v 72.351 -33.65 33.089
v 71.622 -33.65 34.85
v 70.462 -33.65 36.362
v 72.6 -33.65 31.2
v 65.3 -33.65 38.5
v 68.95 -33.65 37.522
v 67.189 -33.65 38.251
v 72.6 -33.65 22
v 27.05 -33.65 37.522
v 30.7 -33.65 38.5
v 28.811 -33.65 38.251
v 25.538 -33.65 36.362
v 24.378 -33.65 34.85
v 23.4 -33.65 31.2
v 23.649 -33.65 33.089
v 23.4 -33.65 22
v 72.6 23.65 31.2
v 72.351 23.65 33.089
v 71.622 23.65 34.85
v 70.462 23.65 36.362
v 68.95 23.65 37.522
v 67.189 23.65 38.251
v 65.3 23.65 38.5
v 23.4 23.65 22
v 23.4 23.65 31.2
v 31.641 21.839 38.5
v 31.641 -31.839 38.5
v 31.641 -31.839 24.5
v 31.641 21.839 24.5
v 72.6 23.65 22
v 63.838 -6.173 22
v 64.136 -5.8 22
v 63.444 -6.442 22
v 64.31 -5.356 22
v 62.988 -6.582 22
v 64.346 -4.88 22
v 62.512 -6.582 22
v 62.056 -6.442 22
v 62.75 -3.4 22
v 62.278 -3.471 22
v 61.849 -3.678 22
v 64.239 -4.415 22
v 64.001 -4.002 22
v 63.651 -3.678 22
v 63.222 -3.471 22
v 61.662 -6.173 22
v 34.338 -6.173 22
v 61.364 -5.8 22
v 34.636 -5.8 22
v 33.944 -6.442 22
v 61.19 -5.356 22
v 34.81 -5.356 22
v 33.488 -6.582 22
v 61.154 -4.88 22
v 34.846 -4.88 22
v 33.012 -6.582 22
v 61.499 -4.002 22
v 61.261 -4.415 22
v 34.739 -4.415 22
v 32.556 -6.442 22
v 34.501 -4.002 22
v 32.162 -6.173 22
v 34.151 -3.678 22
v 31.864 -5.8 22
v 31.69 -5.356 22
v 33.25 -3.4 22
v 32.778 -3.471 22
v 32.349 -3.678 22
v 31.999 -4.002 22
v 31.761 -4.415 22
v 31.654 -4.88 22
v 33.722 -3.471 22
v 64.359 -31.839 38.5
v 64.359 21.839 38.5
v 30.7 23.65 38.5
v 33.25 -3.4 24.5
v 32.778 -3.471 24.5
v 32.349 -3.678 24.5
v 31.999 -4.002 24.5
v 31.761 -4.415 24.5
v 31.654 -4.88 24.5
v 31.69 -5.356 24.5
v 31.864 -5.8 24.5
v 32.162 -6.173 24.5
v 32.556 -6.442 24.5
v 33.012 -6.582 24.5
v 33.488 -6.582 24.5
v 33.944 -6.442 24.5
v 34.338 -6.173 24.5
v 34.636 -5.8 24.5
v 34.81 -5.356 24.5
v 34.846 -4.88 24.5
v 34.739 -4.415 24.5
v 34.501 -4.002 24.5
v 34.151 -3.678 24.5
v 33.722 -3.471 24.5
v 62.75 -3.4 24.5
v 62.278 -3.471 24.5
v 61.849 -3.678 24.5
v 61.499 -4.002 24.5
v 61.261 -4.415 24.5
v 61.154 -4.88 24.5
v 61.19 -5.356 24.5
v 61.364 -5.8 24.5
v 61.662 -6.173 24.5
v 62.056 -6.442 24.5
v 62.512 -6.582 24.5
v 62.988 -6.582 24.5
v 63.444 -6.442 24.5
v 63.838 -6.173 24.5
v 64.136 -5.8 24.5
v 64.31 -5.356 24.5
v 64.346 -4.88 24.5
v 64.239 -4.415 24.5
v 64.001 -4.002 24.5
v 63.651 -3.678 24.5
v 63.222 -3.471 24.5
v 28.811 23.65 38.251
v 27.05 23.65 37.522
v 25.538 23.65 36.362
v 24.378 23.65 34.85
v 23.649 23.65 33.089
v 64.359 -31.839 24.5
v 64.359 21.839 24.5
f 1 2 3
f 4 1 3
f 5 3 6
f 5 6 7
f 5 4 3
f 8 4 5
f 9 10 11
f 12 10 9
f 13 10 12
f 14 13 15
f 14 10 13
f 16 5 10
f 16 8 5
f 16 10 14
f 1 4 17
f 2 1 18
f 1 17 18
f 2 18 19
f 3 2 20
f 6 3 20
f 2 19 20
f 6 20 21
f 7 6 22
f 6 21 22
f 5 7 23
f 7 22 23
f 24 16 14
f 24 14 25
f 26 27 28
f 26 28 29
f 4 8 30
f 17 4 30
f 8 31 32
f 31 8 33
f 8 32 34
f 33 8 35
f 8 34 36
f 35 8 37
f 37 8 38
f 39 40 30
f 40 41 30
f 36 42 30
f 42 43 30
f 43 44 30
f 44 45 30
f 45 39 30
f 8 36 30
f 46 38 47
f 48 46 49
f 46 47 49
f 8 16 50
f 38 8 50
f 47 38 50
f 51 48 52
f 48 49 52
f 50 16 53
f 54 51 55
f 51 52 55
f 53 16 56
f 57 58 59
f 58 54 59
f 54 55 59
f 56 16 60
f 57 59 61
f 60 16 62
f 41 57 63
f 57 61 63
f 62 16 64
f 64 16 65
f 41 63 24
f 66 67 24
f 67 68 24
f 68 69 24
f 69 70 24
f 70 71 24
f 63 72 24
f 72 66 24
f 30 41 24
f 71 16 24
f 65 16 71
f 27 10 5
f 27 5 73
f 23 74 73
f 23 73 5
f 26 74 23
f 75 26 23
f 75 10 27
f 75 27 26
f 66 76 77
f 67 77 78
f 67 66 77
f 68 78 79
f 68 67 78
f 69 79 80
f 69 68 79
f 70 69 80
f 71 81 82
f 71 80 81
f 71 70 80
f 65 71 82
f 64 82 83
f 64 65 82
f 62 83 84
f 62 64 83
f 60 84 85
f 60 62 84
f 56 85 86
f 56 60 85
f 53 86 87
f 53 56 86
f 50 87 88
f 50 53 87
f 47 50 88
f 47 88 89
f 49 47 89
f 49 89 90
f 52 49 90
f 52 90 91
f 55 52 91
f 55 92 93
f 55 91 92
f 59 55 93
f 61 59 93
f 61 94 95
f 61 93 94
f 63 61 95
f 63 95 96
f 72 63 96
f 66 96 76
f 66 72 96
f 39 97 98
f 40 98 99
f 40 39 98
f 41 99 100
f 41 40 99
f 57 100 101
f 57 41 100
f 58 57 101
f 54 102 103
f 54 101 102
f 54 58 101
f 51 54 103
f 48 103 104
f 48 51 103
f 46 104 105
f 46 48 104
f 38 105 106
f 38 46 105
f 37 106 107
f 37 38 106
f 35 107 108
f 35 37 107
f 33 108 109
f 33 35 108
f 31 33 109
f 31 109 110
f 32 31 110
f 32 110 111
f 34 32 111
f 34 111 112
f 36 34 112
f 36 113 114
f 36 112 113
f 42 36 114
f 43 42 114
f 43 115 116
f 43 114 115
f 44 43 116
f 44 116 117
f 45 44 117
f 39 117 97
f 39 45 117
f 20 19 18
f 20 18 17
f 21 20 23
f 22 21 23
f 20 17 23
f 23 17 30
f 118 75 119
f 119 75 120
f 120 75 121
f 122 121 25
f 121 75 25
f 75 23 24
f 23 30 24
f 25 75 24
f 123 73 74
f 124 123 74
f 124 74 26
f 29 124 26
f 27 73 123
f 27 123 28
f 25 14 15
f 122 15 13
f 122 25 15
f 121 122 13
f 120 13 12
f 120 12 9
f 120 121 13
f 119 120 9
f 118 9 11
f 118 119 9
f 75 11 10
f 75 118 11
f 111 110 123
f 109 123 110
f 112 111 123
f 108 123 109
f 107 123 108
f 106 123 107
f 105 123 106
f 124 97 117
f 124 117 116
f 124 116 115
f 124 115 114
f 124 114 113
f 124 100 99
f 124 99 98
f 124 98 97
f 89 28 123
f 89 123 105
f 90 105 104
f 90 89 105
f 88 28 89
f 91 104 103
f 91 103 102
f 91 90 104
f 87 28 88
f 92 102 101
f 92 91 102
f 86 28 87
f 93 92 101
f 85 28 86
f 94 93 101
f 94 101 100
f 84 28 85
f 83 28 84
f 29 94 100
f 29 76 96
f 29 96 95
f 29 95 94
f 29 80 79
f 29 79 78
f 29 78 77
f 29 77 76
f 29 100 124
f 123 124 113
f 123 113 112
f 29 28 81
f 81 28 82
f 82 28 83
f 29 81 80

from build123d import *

# Parameters (mm, degrees)
SKETCH026_W           = 57.3
SKETCH026_H           = 49.2
SKETCH026_R           = 1.6
PAD010002001016_DEPTH = 16.5
FILLET004_R           = 7.3
SKETCH028_W           = 53.6778
SKETCH028_H           = 32.7182
POCKET001_DEPTH       = 14


with BuildPart() as part:
    # Sketch026 → Pad010002001016 (new body)
    with BuildSketch(Plane(origin=(48, -5, 22), x_dir=(0, 1, 0), z_dir=(0, 0, 1))):
        Rectangle(SKETCH026_W, SKETCH026_H)
        with Locations((0, 14.75)):
            Circle(SKETCH026_R, mode=Mode.SUBTRACT)
        with Locations((0, -14.75)):
            Circle(SKETCH026_R, mode=Mode.SUBTRACT)
    extrude(amount=PAD010002001016_DEPTH)

    # Fillet004
    fillet004_edges = [part.edges().sort_by_distance(p)[0] for p in [
        (72.6, -5, 38.5),
        (23.4, -5, 38.5),
    ]]
    fillet(fillet004_edges, radius=FILLET004_R)

    # Sketch028 → Pocket001 (cut)
    with BuildSketch(Plane(origin=(48, -5, 38.5), x_dir=(0, 1, 0), z_dir=(0, 0, 1))):
        Rectangle(SKETCH028_W, SKETCH028_H)
    extrude(amount=-POCKET001_DEPTH, mode=Mode.SUBTRACT)


solid = part.part
